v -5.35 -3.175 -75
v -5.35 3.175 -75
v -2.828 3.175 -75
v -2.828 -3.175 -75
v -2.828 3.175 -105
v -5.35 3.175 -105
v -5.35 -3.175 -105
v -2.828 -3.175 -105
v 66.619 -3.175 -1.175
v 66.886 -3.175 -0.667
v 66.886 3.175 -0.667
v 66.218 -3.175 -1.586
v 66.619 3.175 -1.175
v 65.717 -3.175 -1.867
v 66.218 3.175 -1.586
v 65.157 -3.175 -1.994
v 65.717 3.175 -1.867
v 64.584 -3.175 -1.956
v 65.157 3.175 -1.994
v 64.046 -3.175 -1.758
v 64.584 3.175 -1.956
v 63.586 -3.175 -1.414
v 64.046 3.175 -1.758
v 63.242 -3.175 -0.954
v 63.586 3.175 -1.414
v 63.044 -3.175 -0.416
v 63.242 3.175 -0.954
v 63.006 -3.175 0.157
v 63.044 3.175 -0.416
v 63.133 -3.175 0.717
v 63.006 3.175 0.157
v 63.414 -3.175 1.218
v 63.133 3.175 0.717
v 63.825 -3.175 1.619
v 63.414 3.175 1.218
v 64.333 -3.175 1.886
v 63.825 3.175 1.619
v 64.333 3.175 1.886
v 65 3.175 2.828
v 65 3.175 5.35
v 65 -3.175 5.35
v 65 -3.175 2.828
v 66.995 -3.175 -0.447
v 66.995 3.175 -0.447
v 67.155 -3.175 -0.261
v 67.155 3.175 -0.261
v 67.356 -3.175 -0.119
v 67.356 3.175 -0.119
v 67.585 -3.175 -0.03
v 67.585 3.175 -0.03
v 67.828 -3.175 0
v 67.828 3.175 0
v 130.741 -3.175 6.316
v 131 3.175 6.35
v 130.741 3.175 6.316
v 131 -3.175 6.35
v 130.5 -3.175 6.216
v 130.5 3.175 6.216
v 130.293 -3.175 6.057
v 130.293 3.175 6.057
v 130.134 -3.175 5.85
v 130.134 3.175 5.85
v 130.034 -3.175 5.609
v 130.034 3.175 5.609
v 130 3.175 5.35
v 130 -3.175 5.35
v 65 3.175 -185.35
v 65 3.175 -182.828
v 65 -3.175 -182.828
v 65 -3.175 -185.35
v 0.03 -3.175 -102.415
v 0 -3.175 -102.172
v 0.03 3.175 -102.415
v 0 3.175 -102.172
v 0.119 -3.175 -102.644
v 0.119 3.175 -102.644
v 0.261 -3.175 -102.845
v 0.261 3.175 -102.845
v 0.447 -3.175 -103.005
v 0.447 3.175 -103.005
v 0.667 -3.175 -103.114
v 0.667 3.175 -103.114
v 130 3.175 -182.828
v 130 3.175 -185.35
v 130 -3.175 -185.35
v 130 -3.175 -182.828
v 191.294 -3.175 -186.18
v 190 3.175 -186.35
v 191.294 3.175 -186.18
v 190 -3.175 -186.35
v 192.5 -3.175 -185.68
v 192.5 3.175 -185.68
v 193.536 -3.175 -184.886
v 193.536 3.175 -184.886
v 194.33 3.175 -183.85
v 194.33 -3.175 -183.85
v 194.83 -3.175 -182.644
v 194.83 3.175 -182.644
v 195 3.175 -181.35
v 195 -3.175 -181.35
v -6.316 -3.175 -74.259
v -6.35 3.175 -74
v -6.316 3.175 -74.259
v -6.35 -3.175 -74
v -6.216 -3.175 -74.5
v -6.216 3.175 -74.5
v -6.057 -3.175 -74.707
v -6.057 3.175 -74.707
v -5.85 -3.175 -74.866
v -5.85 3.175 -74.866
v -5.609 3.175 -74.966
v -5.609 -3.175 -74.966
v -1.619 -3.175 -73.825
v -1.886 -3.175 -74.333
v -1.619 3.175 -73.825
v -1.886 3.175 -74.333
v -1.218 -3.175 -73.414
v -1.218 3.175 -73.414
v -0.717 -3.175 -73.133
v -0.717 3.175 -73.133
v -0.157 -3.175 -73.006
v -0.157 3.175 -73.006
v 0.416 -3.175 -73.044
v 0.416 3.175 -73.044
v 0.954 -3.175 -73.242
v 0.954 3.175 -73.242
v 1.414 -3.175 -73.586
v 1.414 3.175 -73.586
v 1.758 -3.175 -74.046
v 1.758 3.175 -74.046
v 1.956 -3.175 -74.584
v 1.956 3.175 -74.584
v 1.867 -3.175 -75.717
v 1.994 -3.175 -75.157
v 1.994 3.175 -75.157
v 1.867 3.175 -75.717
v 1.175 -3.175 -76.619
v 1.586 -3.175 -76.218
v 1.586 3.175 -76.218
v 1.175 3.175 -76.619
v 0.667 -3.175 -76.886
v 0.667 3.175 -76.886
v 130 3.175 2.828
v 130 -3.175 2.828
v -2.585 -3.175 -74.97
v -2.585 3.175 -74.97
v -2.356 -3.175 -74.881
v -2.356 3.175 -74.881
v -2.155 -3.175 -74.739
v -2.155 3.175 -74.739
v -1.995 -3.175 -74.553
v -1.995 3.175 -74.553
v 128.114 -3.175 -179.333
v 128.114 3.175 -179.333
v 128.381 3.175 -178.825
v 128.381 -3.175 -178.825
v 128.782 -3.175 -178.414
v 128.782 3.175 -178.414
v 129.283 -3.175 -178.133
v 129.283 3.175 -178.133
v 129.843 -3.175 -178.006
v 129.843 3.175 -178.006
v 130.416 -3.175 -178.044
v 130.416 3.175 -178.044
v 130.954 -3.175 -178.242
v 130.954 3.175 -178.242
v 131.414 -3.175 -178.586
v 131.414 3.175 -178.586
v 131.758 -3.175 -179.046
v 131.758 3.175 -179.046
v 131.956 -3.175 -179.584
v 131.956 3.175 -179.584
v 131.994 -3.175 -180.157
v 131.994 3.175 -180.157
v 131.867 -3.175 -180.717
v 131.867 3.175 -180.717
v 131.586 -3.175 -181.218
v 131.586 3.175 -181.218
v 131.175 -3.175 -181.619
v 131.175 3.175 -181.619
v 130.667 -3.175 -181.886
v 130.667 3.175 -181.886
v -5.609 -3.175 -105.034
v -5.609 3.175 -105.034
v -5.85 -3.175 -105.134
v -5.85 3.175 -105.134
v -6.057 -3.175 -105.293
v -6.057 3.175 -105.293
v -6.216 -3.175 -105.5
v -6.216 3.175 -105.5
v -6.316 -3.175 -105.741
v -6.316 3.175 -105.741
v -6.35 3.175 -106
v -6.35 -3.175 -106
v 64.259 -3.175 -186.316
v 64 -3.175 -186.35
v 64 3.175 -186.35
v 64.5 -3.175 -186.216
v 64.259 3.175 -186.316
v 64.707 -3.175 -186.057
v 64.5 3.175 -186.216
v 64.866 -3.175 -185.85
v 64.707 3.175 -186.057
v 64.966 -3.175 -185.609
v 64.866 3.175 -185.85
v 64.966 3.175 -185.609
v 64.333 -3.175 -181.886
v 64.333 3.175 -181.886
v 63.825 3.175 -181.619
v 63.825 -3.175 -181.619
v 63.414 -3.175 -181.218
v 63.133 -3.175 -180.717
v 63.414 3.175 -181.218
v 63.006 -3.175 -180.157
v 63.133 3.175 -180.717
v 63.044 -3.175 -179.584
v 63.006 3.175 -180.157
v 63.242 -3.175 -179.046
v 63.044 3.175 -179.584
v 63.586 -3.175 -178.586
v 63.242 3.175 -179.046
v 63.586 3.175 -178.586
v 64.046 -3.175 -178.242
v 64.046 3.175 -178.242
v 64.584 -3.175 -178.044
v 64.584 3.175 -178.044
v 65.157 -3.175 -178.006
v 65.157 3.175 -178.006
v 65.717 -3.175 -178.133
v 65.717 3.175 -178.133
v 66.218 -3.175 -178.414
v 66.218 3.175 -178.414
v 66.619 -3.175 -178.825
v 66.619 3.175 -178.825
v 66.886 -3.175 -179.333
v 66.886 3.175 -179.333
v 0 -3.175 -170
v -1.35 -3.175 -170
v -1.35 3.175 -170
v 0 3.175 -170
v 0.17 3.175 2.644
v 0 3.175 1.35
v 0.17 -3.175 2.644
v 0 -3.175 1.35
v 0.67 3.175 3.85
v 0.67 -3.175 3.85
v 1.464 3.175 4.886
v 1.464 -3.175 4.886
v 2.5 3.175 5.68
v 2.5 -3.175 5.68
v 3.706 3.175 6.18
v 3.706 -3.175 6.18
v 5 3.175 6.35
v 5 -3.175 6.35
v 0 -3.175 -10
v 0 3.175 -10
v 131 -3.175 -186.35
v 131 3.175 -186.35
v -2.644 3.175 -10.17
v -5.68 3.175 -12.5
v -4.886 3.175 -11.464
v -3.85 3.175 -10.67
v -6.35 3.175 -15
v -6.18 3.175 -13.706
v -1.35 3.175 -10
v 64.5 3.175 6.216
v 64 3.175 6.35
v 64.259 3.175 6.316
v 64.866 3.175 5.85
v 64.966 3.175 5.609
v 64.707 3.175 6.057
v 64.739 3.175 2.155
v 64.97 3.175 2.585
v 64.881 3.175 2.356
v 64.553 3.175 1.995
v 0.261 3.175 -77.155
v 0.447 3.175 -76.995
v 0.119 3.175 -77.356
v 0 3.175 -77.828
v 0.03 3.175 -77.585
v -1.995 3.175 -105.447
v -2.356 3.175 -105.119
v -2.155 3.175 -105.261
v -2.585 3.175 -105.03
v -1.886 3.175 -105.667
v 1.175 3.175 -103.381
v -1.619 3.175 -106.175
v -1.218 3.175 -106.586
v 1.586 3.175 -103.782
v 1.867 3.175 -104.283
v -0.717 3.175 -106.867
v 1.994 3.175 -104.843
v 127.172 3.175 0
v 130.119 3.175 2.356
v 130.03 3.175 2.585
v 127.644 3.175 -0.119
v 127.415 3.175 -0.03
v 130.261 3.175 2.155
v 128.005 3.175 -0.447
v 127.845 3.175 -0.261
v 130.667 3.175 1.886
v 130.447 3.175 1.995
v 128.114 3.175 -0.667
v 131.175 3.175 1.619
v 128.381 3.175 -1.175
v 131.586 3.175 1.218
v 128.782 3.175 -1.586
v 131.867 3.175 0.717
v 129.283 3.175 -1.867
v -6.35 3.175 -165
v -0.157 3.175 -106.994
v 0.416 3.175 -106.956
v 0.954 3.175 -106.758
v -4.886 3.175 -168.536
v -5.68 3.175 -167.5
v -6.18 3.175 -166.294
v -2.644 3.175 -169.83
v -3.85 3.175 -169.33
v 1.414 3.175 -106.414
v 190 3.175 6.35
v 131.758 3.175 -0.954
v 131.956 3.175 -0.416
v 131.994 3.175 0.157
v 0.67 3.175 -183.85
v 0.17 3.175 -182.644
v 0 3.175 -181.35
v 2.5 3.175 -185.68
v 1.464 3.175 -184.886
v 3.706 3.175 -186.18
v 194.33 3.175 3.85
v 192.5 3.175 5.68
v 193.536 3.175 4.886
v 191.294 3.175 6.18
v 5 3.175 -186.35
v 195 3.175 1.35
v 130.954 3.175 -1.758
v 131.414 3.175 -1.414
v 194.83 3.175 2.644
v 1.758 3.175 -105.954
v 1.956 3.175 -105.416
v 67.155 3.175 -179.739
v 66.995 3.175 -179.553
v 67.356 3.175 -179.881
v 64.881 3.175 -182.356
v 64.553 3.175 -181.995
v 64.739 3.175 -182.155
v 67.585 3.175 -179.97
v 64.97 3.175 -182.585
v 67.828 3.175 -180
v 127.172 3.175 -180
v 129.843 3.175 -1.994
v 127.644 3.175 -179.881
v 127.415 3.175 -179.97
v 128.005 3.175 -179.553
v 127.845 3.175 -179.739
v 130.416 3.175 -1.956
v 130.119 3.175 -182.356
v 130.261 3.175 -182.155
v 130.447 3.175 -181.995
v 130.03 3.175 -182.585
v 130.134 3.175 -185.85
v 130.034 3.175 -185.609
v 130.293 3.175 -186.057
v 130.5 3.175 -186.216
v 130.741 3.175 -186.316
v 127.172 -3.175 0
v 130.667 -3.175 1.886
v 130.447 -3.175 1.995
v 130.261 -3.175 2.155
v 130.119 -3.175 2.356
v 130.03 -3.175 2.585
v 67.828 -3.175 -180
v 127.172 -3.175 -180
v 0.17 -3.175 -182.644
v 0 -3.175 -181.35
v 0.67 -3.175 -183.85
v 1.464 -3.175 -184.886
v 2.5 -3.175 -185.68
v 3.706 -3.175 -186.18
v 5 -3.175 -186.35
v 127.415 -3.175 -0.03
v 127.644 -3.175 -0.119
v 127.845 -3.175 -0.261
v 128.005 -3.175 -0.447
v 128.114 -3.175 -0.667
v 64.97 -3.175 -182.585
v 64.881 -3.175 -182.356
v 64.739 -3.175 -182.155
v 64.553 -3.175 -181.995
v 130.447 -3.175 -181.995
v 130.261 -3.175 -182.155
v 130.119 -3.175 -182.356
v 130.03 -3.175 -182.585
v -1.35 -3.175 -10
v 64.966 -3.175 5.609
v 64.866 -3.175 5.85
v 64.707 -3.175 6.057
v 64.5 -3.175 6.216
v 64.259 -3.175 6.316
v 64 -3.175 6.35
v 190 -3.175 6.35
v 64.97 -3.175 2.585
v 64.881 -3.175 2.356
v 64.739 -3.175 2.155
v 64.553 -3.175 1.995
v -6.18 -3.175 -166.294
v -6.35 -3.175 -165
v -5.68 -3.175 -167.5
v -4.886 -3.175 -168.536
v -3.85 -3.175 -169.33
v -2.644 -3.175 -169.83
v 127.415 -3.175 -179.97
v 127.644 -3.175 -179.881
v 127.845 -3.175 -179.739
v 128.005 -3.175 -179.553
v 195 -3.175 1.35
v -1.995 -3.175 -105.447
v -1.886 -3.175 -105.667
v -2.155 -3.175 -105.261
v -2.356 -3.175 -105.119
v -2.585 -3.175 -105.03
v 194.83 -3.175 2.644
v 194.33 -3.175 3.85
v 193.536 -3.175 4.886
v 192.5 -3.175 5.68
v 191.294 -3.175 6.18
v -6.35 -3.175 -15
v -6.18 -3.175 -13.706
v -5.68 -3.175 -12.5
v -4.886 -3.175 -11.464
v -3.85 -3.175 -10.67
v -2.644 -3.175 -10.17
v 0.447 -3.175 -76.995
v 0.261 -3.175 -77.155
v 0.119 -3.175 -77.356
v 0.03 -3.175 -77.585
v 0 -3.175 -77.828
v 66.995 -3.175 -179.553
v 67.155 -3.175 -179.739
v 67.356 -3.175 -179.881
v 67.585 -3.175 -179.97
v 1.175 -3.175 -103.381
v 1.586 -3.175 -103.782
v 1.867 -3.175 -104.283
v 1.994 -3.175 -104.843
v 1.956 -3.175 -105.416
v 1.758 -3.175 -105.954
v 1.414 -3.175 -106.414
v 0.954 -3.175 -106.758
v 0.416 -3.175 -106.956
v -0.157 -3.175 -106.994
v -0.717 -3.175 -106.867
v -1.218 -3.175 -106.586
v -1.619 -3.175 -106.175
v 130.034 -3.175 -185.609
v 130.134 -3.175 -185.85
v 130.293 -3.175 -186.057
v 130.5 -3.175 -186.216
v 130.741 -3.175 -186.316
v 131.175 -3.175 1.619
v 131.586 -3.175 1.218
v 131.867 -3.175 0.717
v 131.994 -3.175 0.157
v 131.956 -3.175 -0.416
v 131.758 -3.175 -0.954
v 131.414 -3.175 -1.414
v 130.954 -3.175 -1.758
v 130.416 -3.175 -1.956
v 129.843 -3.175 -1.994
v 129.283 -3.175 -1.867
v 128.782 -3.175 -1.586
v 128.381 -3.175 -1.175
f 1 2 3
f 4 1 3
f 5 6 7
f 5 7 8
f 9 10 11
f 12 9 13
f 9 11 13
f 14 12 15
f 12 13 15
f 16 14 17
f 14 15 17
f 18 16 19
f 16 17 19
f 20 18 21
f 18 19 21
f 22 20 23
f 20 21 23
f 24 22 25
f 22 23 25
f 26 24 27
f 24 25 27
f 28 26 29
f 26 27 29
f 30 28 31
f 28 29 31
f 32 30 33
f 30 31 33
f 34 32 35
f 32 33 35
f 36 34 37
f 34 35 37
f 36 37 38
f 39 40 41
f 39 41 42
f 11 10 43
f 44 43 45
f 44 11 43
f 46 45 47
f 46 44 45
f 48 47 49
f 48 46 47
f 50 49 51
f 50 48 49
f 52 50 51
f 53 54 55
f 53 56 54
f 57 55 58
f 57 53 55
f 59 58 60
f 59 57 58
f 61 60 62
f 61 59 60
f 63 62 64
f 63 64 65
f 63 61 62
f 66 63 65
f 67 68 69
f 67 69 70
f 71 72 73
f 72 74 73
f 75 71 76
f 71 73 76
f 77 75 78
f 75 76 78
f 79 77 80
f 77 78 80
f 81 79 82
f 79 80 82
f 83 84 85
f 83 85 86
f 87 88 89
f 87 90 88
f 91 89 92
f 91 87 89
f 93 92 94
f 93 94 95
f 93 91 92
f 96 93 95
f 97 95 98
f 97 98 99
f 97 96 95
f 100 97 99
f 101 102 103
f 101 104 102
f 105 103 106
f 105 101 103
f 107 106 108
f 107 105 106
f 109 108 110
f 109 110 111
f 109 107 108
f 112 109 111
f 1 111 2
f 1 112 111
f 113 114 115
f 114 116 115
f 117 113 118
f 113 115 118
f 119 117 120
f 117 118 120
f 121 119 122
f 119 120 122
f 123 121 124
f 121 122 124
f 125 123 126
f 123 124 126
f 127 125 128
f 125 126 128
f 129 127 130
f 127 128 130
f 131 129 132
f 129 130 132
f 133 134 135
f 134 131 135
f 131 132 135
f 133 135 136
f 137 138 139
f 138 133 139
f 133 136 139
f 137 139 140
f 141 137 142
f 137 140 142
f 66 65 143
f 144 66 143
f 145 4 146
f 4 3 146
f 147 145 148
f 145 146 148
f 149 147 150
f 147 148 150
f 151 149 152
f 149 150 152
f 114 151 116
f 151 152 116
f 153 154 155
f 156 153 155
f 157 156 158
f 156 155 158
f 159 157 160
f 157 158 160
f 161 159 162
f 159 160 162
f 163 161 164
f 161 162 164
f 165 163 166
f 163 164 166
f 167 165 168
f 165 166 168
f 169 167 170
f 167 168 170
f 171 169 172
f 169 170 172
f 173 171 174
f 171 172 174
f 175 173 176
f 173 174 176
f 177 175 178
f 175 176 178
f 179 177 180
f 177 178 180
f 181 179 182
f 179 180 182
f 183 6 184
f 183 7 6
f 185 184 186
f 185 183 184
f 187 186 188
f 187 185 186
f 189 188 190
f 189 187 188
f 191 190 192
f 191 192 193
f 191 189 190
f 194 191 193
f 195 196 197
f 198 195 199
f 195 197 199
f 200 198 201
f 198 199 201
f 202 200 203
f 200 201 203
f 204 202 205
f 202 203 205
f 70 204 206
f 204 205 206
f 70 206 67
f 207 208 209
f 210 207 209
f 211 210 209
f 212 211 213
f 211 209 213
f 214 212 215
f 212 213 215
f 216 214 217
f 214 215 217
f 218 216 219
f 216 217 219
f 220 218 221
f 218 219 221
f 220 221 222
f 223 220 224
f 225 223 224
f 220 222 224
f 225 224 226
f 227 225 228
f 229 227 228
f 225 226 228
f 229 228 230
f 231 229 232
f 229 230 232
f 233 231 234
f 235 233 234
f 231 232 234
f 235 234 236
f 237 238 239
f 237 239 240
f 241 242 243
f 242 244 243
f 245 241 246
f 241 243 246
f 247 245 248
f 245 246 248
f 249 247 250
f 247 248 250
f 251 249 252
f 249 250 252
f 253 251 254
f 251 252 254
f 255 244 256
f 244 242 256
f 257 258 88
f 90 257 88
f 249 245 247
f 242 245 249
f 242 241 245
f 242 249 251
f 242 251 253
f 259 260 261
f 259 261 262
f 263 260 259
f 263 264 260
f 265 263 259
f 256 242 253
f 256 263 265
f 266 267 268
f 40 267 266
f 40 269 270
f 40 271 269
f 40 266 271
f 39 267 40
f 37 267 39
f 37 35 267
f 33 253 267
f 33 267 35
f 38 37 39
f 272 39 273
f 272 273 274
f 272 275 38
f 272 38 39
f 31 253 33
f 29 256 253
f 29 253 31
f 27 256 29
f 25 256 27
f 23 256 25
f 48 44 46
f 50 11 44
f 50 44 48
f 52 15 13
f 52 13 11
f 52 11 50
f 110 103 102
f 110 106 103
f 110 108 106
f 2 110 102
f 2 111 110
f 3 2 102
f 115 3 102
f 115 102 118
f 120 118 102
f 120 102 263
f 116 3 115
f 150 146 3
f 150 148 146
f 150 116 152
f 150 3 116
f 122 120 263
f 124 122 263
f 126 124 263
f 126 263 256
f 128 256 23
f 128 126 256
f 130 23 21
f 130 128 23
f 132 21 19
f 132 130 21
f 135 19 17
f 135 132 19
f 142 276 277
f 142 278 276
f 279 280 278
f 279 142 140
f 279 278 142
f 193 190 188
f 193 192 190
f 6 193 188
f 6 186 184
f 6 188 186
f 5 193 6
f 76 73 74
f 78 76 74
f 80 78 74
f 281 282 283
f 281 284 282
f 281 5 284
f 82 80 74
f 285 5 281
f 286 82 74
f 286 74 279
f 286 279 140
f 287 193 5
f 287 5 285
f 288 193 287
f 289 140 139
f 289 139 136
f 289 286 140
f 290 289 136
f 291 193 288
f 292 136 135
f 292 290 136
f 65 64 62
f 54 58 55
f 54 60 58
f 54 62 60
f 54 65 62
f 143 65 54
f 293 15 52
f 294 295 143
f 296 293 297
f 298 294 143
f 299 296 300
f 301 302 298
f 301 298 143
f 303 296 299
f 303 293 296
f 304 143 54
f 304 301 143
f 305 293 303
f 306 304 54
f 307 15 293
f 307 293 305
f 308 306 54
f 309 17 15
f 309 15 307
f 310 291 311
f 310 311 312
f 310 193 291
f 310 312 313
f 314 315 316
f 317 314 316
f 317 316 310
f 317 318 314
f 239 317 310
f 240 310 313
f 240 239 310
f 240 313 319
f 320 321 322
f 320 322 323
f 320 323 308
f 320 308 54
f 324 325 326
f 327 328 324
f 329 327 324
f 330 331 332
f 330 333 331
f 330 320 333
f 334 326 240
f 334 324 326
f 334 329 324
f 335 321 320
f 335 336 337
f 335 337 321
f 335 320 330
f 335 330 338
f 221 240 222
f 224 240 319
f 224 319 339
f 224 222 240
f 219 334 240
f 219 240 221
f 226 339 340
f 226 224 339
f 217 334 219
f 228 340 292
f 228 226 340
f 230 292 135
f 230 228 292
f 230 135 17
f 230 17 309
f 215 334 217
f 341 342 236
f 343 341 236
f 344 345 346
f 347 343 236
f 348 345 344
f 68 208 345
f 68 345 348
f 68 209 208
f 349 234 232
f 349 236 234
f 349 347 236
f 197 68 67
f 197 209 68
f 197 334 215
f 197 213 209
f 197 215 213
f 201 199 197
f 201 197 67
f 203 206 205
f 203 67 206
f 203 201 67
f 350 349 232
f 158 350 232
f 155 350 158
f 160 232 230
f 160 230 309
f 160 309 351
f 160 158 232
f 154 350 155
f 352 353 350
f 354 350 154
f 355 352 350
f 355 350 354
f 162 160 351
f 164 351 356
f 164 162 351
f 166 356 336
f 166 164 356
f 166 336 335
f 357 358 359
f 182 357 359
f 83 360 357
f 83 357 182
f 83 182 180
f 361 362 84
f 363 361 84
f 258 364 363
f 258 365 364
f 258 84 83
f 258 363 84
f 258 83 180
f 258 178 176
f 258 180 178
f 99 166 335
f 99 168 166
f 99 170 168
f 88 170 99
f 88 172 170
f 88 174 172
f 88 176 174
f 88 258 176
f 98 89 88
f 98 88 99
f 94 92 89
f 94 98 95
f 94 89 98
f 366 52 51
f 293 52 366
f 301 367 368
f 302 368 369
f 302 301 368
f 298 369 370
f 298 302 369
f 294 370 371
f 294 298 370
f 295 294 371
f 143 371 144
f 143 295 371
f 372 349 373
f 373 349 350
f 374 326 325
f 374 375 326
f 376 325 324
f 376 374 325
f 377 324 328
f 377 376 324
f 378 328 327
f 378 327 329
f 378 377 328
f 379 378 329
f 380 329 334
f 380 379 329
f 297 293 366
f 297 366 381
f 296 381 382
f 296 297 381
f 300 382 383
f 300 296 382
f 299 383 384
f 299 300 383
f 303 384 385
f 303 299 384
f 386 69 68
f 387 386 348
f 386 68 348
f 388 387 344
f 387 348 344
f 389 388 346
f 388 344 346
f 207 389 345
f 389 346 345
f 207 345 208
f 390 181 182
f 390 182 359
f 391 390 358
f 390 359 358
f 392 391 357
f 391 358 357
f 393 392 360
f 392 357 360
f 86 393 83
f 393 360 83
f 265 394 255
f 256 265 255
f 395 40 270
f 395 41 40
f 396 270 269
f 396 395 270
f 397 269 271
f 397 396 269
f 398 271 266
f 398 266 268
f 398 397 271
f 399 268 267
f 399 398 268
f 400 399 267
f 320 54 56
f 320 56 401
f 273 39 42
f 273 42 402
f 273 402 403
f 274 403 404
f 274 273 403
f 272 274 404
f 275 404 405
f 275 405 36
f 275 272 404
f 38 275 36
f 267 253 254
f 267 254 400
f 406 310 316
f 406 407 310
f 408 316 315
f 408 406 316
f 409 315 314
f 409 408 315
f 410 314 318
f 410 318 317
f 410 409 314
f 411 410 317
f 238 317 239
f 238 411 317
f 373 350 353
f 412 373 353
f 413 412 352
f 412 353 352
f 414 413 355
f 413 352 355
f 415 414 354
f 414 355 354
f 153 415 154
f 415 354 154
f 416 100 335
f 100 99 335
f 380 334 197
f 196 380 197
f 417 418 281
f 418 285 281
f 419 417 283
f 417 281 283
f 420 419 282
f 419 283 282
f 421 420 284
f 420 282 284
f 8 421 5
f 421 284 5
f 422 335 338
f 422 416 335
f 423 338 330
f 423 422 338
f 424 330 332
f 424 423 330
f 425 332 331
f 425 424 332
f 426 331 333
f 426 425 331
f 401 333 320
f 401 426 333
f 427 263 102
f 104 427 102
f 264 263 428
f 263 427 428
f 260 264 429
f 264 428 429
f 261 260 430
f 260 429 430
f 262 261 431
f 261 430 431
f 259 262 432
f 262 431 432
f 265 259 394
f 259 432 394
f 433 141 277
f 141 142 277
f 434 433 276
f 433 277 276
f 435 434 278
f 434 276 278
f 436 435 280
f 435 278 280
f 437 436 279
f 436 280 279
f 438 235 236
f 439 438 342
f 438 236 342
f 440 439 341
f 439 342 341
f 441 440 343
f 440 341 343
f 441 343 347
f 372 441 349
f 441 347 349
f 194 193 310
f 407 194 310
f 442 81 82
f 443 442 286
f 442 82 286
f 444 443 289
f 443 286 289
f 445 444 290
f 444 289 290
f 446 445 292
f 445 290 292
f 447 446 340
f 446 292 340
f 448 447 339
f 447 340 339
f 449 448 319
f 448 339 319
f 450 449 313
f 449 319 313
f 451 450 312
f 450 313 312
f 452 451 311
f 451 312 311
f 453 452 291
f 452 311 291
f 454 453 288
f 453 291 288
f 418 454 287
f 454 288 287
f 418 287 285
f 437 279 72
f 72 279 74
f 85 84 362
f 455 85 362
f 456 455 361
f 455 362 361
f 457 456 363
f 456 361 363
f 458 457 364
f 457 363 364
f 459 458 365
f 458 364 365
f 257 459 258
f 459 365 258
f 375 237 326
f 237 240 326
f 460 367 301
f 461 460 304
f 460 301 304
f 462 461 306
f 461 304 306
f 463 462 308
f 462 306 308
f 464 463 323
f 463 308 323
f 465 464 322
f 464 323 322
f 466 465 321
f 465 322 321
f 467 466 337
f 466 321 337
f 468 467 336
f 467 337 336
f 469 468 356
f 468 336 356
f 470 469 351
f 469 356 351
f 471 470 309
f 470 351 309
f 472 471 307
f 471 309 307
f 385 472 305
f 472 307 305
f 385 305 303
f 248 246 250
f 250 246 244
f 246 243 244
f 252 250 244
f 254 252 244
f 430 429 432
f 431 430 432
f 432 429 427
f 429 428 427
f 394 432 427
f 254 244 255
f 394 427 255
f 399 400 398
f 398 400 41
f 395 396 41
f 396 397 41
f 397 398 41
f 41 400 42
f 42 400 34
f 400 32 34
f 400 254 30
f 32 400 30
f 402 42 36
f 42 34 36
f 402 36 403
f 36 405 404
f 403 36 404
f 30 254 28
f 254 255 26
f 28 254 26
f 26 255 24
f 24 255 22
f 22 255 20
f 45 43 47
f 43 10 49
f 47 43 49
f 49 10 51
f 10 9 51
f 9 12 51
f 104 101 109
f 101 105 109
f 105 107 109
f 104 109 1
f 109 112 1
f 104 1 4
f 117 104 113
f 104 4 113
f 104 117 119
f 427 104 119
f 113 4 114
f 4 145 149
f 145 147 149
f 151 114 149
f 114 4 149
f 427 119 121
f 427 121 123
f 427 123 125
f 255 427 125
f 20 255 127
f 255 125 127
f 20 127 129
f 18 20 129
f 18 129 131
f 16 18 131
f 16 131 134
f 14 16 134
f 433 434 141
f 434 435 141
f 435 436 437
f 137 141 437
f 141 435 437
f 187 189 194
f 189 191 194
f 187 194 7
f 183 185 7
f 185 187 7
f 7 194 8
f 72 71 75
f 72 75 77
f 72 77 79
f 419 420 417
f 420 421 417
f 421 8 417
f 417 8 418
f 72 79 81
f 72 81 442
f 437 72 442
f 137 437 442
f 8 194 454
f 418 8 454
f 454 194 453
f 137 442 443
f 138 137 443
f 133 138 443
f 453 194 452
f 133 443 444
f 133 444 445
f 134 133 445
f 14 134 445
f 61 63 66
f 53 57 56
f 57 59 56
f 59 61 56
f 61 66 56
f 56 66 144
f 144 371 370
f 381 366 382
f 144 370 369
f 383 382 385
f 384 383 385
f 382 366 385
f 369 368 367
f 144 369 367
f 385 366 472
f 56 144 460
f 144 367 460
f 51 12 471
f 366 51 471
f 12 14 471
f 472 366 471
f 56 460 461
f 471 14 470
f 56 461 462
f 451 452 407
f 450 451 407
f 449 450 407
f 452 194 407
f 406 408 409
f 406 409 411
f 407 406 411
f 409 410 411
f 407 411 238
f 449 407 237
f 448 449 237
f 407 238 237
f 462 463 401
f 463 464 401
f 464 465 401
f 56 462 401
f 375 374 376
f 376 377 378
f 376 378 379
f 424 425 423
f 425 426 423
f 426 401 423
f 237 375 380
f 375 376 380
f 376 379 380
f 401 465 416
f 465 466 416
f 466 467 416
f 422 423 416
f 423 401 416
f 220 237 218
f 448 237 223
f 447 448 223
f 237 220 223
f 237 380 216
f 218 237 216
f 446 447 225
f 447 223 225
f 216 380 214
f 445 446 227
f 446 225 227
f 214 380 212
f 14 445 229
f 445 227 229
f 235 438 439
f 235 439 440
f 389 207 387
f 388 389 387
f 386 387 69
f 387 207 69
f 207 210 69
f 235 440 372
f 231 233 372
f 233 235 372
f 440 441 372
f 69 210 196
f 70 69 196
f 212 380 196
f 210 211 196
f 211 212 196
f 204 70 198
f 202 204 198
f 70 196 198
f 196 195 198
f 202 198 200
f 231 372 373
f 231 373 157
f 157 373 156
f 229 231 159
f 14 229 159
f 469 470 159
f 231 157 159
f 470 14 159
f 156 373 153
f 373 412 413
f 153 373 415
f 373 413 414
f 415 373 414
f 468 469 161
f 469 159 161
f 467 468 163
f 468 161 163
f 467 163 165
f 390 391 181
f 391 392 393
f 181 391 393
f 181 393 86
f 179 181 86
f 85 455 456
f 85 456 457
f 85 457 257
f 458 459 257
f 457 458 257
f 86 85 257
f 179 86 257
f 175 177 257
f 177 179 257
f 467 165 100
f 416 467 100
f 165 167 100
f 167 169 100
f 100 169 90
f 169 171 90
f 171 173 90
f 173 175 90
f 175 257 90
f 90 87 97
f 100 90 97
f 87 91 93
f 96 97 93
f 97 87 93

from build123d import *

# Parameters (mm, degrees)
SKETCH1_W               = 195
SKETCH1_H               = 180
BOSS_EXTRUDE1_DEPTH     = 3.175
SKETCH2_W               = 65
SKETCH2_H               = 6.35
BOSS_EXTRUDE2_DEPTH     = 6.35
LPATTERN1_COUNT         = 2
LPATTERN1_PITCH         = 130
MIRROR1_COPY_1_SKETCH_W = 65
MIRROR1_COPY_1_SKETCH_H = 6.35
MIRROR1_COPY_1_DEPTH    = 6.35
SKETCH3_W               = 6.35
SKETCH3_H               = 65
BOSS_EXTRUDE3_DEPTH     = 6.35
SKETCH4_R               = 2
CUT_EXTRUDE1_DEPTH      = 7.35
FILLET1_R               = 1
CUT_EXTRUDE2_DEPTH      = 7.35
SKETCH6_R               = 2
CUT_EXTRUDE3_DEPTH      = 7.35
FILLET2_R               = 1
FILLET3_R               = 5


with BuildPart() as part:
    # Sketch1 → Boss-Extrude1 (new body, symmetric)
    with BuildSketch(Plane(origin=(0, 0, 0), x_dir=(1, 0, 0), z_dir=(0, 1, 0))):
        with Locations((97.5, 90)):
            Rectangle(SKETCH1_W, SKETCH1_H)
    extrude(amount=BOSS_EXTRUDE1_DEPTH, both=True)

    # Sketch2 → Boss-Extrude2 (add)
    with BuildSketch(Plane(origin=(0, 3.175, 0), x_dir=(1, 0, 0), z_dir=(0, 1, 0))):
        with Locations((162.5, -3.175)):
            Rectangle(SKETCH2_W, SKETCH2_H)
    boss_extrude2 = extrude(amount=-BOSS_EXTRUDE2_DEPTH)

    # LPattern1: Boss-Extrude2 ×2
    with Locations(*[(-i * LPATTERN1_PITCH, 0, 0) for i in range(1, LPATTERN1_COUNT)]):
        add(boss_extrude2)

    # Mirror1: Boss-Extrude2 across plane
    add(boss_extrude2.mirror(Plane.XY.offset(-90)))

    # Mirror1 copy 1 sketch → Mirror1 copy 1 (add)
    with BuildSketch(Plane(origin=(-130, 3.175, -180), x_dir=(1, 0, 0), z_dir=(0, 1, 0))):
        with Locations((162.5, 3.175)):
            Rectangle(MIRROR1_COPY_1_SKETCH_W, MIRROR1_COPY_1_SKETCH_H)
    extrude(amount=-MIRROR1_COPY_1_DEPTH)

    # Sketch3 → Boss-Extrude3 (add)
    with BuildSketch(Plane(origin=(0, 3.175, 0), x_dir=(1, 0, 0), z_dir=(0, 1, 0))):
        with Locations((-3.175, 137.5)):
            Rectangle(SKETCH3_W, SKETCH3_H)
        with Locations((-3.175, 42.5)):
            Rectangle(SKETCH3_W, SKETCH3_H)
    extrude(amount=-BOSS_EXTRUDE3_DEPTH)

    # Sketch4 → Cut-Extrude1 (cut, through all)
    with BuildSketch(Plane(origin=(0, 3.175, 0), x_dir=(1, 0, 0), z_dir=(0, 1, 0))):
        with Locations((65, 0)):
            Circle(SKETCH4_R)
        with Locations((130, 0)):
            Circle(SKETCH4_R)
    extrude(amount=-CUT_EXTRUDE1_DEPTH, mode=Mode.SUBTRACT)

    # Fillet1
    fillet1_edges = [part.edges().sort_by_distance(p)[0] for p in [
        (130, 0, 6.35),
        (65, 0, 6.35),
    ]]
    fillet(fillet1_edges, radius=FILLET1_R)

    # Sketch5 → Cut-Extrude2 (cut, through all)
    with BuildSketch(Plane(origin=(0, 3.175, 0), x_dir=(1, 0, 0), z_dir=(0, 1, 0))):
        with BuildLine():
            Line((130, -2.828427125), (130, -5.35))
            ThreePointArc((130, -5.35), (130.292893219, -6.057106781), (131, -6.35))
            Line((131, -6.35), (64, -6.35))
            ThreePointArc((64, -6.35), (64.707106781, -6.057106781), (65, -5.35))
            Line((65, -5.35), (65, -2.828427125))
            ThreePointArc((65, -2.828427125), (64.816496581, -2.251076856), (64.333333333, -1.885618083))
            ThreePointArc((64.333333333, -1.885618083), (63.585786438, 1.414213562), (66.885618083, 0.666666667))
            ThreePointArc((66.885618083, 0.666666667), (67.251076856, 0.183503419), (67.828427125, 0))
            Line((67.828427125, 0), (127.171572875, 0))
            ThreePointArc((127.171572875, 0), (127.748923144, 0.183503419), (128.114381917, 0.666666667))
            ThreePointArc((128.114381917, 0.666666667), (131.414213562, 1.414213562), (130.666666667, -1.885618083))
            ThreePointArc((130.666666667, -1.885618083), (130.183503419, -2.251076856), (130, -2.828427125))
        make_face()
    cut_extrude2 = extrude(amount=-CUT_EXTRUDE2_DEPTH, mode=Mode.SUBTRACT)

    # Mirror3: Cut-Extrude2 across plane
    add(cut_extrude2.mirror(Plane.XY.offset(-90)), mode=Mode.SUBTRACT)

    # Sketch6 → Cut-Extrude3 (cut, through all)
    with BuildSketch(Plane(origin=(0, 3.175, 0), x_dir=(1, 0, 0), z_dir=(0, 1, 0))):
        with Locations((0, 105)):
            Circle(SKETCH6_R)
        with Locations((0, 75)):
            Circle(SKETCH6_R)
    extrude(amount=-CUT_EXTRUDE3_DEPTH, mode=Mode.SUBTRACT)

    # Fillet2
    fillet2_edges = [part.edges().sort_by_distance(p)[0] for p in [
        (-2, 0, -75),
        (-2, 0, -105),
        (0, 0, -103),
        (0, 0, -77),
        (-6.35, 0, -105),
        (-6.35, 0, -75),
    ]]
    fillet(fillet2_edges, radius=FILLET2_R)

    # Fillet3
    fillet3_edges = [part.edges().sort_by_distance(p)[0] for p in [
        (195, 0, 6.35),
        (0, 0, 6.35),
        (195, 0, -186.35),
        (0, 0, -186.35),
        (-6.35, 0, -170),
        (-6.35, 0, -10),
    ]]
    fillet(fillet3_edges, radius=FILLET3_R)


solid = part.part
